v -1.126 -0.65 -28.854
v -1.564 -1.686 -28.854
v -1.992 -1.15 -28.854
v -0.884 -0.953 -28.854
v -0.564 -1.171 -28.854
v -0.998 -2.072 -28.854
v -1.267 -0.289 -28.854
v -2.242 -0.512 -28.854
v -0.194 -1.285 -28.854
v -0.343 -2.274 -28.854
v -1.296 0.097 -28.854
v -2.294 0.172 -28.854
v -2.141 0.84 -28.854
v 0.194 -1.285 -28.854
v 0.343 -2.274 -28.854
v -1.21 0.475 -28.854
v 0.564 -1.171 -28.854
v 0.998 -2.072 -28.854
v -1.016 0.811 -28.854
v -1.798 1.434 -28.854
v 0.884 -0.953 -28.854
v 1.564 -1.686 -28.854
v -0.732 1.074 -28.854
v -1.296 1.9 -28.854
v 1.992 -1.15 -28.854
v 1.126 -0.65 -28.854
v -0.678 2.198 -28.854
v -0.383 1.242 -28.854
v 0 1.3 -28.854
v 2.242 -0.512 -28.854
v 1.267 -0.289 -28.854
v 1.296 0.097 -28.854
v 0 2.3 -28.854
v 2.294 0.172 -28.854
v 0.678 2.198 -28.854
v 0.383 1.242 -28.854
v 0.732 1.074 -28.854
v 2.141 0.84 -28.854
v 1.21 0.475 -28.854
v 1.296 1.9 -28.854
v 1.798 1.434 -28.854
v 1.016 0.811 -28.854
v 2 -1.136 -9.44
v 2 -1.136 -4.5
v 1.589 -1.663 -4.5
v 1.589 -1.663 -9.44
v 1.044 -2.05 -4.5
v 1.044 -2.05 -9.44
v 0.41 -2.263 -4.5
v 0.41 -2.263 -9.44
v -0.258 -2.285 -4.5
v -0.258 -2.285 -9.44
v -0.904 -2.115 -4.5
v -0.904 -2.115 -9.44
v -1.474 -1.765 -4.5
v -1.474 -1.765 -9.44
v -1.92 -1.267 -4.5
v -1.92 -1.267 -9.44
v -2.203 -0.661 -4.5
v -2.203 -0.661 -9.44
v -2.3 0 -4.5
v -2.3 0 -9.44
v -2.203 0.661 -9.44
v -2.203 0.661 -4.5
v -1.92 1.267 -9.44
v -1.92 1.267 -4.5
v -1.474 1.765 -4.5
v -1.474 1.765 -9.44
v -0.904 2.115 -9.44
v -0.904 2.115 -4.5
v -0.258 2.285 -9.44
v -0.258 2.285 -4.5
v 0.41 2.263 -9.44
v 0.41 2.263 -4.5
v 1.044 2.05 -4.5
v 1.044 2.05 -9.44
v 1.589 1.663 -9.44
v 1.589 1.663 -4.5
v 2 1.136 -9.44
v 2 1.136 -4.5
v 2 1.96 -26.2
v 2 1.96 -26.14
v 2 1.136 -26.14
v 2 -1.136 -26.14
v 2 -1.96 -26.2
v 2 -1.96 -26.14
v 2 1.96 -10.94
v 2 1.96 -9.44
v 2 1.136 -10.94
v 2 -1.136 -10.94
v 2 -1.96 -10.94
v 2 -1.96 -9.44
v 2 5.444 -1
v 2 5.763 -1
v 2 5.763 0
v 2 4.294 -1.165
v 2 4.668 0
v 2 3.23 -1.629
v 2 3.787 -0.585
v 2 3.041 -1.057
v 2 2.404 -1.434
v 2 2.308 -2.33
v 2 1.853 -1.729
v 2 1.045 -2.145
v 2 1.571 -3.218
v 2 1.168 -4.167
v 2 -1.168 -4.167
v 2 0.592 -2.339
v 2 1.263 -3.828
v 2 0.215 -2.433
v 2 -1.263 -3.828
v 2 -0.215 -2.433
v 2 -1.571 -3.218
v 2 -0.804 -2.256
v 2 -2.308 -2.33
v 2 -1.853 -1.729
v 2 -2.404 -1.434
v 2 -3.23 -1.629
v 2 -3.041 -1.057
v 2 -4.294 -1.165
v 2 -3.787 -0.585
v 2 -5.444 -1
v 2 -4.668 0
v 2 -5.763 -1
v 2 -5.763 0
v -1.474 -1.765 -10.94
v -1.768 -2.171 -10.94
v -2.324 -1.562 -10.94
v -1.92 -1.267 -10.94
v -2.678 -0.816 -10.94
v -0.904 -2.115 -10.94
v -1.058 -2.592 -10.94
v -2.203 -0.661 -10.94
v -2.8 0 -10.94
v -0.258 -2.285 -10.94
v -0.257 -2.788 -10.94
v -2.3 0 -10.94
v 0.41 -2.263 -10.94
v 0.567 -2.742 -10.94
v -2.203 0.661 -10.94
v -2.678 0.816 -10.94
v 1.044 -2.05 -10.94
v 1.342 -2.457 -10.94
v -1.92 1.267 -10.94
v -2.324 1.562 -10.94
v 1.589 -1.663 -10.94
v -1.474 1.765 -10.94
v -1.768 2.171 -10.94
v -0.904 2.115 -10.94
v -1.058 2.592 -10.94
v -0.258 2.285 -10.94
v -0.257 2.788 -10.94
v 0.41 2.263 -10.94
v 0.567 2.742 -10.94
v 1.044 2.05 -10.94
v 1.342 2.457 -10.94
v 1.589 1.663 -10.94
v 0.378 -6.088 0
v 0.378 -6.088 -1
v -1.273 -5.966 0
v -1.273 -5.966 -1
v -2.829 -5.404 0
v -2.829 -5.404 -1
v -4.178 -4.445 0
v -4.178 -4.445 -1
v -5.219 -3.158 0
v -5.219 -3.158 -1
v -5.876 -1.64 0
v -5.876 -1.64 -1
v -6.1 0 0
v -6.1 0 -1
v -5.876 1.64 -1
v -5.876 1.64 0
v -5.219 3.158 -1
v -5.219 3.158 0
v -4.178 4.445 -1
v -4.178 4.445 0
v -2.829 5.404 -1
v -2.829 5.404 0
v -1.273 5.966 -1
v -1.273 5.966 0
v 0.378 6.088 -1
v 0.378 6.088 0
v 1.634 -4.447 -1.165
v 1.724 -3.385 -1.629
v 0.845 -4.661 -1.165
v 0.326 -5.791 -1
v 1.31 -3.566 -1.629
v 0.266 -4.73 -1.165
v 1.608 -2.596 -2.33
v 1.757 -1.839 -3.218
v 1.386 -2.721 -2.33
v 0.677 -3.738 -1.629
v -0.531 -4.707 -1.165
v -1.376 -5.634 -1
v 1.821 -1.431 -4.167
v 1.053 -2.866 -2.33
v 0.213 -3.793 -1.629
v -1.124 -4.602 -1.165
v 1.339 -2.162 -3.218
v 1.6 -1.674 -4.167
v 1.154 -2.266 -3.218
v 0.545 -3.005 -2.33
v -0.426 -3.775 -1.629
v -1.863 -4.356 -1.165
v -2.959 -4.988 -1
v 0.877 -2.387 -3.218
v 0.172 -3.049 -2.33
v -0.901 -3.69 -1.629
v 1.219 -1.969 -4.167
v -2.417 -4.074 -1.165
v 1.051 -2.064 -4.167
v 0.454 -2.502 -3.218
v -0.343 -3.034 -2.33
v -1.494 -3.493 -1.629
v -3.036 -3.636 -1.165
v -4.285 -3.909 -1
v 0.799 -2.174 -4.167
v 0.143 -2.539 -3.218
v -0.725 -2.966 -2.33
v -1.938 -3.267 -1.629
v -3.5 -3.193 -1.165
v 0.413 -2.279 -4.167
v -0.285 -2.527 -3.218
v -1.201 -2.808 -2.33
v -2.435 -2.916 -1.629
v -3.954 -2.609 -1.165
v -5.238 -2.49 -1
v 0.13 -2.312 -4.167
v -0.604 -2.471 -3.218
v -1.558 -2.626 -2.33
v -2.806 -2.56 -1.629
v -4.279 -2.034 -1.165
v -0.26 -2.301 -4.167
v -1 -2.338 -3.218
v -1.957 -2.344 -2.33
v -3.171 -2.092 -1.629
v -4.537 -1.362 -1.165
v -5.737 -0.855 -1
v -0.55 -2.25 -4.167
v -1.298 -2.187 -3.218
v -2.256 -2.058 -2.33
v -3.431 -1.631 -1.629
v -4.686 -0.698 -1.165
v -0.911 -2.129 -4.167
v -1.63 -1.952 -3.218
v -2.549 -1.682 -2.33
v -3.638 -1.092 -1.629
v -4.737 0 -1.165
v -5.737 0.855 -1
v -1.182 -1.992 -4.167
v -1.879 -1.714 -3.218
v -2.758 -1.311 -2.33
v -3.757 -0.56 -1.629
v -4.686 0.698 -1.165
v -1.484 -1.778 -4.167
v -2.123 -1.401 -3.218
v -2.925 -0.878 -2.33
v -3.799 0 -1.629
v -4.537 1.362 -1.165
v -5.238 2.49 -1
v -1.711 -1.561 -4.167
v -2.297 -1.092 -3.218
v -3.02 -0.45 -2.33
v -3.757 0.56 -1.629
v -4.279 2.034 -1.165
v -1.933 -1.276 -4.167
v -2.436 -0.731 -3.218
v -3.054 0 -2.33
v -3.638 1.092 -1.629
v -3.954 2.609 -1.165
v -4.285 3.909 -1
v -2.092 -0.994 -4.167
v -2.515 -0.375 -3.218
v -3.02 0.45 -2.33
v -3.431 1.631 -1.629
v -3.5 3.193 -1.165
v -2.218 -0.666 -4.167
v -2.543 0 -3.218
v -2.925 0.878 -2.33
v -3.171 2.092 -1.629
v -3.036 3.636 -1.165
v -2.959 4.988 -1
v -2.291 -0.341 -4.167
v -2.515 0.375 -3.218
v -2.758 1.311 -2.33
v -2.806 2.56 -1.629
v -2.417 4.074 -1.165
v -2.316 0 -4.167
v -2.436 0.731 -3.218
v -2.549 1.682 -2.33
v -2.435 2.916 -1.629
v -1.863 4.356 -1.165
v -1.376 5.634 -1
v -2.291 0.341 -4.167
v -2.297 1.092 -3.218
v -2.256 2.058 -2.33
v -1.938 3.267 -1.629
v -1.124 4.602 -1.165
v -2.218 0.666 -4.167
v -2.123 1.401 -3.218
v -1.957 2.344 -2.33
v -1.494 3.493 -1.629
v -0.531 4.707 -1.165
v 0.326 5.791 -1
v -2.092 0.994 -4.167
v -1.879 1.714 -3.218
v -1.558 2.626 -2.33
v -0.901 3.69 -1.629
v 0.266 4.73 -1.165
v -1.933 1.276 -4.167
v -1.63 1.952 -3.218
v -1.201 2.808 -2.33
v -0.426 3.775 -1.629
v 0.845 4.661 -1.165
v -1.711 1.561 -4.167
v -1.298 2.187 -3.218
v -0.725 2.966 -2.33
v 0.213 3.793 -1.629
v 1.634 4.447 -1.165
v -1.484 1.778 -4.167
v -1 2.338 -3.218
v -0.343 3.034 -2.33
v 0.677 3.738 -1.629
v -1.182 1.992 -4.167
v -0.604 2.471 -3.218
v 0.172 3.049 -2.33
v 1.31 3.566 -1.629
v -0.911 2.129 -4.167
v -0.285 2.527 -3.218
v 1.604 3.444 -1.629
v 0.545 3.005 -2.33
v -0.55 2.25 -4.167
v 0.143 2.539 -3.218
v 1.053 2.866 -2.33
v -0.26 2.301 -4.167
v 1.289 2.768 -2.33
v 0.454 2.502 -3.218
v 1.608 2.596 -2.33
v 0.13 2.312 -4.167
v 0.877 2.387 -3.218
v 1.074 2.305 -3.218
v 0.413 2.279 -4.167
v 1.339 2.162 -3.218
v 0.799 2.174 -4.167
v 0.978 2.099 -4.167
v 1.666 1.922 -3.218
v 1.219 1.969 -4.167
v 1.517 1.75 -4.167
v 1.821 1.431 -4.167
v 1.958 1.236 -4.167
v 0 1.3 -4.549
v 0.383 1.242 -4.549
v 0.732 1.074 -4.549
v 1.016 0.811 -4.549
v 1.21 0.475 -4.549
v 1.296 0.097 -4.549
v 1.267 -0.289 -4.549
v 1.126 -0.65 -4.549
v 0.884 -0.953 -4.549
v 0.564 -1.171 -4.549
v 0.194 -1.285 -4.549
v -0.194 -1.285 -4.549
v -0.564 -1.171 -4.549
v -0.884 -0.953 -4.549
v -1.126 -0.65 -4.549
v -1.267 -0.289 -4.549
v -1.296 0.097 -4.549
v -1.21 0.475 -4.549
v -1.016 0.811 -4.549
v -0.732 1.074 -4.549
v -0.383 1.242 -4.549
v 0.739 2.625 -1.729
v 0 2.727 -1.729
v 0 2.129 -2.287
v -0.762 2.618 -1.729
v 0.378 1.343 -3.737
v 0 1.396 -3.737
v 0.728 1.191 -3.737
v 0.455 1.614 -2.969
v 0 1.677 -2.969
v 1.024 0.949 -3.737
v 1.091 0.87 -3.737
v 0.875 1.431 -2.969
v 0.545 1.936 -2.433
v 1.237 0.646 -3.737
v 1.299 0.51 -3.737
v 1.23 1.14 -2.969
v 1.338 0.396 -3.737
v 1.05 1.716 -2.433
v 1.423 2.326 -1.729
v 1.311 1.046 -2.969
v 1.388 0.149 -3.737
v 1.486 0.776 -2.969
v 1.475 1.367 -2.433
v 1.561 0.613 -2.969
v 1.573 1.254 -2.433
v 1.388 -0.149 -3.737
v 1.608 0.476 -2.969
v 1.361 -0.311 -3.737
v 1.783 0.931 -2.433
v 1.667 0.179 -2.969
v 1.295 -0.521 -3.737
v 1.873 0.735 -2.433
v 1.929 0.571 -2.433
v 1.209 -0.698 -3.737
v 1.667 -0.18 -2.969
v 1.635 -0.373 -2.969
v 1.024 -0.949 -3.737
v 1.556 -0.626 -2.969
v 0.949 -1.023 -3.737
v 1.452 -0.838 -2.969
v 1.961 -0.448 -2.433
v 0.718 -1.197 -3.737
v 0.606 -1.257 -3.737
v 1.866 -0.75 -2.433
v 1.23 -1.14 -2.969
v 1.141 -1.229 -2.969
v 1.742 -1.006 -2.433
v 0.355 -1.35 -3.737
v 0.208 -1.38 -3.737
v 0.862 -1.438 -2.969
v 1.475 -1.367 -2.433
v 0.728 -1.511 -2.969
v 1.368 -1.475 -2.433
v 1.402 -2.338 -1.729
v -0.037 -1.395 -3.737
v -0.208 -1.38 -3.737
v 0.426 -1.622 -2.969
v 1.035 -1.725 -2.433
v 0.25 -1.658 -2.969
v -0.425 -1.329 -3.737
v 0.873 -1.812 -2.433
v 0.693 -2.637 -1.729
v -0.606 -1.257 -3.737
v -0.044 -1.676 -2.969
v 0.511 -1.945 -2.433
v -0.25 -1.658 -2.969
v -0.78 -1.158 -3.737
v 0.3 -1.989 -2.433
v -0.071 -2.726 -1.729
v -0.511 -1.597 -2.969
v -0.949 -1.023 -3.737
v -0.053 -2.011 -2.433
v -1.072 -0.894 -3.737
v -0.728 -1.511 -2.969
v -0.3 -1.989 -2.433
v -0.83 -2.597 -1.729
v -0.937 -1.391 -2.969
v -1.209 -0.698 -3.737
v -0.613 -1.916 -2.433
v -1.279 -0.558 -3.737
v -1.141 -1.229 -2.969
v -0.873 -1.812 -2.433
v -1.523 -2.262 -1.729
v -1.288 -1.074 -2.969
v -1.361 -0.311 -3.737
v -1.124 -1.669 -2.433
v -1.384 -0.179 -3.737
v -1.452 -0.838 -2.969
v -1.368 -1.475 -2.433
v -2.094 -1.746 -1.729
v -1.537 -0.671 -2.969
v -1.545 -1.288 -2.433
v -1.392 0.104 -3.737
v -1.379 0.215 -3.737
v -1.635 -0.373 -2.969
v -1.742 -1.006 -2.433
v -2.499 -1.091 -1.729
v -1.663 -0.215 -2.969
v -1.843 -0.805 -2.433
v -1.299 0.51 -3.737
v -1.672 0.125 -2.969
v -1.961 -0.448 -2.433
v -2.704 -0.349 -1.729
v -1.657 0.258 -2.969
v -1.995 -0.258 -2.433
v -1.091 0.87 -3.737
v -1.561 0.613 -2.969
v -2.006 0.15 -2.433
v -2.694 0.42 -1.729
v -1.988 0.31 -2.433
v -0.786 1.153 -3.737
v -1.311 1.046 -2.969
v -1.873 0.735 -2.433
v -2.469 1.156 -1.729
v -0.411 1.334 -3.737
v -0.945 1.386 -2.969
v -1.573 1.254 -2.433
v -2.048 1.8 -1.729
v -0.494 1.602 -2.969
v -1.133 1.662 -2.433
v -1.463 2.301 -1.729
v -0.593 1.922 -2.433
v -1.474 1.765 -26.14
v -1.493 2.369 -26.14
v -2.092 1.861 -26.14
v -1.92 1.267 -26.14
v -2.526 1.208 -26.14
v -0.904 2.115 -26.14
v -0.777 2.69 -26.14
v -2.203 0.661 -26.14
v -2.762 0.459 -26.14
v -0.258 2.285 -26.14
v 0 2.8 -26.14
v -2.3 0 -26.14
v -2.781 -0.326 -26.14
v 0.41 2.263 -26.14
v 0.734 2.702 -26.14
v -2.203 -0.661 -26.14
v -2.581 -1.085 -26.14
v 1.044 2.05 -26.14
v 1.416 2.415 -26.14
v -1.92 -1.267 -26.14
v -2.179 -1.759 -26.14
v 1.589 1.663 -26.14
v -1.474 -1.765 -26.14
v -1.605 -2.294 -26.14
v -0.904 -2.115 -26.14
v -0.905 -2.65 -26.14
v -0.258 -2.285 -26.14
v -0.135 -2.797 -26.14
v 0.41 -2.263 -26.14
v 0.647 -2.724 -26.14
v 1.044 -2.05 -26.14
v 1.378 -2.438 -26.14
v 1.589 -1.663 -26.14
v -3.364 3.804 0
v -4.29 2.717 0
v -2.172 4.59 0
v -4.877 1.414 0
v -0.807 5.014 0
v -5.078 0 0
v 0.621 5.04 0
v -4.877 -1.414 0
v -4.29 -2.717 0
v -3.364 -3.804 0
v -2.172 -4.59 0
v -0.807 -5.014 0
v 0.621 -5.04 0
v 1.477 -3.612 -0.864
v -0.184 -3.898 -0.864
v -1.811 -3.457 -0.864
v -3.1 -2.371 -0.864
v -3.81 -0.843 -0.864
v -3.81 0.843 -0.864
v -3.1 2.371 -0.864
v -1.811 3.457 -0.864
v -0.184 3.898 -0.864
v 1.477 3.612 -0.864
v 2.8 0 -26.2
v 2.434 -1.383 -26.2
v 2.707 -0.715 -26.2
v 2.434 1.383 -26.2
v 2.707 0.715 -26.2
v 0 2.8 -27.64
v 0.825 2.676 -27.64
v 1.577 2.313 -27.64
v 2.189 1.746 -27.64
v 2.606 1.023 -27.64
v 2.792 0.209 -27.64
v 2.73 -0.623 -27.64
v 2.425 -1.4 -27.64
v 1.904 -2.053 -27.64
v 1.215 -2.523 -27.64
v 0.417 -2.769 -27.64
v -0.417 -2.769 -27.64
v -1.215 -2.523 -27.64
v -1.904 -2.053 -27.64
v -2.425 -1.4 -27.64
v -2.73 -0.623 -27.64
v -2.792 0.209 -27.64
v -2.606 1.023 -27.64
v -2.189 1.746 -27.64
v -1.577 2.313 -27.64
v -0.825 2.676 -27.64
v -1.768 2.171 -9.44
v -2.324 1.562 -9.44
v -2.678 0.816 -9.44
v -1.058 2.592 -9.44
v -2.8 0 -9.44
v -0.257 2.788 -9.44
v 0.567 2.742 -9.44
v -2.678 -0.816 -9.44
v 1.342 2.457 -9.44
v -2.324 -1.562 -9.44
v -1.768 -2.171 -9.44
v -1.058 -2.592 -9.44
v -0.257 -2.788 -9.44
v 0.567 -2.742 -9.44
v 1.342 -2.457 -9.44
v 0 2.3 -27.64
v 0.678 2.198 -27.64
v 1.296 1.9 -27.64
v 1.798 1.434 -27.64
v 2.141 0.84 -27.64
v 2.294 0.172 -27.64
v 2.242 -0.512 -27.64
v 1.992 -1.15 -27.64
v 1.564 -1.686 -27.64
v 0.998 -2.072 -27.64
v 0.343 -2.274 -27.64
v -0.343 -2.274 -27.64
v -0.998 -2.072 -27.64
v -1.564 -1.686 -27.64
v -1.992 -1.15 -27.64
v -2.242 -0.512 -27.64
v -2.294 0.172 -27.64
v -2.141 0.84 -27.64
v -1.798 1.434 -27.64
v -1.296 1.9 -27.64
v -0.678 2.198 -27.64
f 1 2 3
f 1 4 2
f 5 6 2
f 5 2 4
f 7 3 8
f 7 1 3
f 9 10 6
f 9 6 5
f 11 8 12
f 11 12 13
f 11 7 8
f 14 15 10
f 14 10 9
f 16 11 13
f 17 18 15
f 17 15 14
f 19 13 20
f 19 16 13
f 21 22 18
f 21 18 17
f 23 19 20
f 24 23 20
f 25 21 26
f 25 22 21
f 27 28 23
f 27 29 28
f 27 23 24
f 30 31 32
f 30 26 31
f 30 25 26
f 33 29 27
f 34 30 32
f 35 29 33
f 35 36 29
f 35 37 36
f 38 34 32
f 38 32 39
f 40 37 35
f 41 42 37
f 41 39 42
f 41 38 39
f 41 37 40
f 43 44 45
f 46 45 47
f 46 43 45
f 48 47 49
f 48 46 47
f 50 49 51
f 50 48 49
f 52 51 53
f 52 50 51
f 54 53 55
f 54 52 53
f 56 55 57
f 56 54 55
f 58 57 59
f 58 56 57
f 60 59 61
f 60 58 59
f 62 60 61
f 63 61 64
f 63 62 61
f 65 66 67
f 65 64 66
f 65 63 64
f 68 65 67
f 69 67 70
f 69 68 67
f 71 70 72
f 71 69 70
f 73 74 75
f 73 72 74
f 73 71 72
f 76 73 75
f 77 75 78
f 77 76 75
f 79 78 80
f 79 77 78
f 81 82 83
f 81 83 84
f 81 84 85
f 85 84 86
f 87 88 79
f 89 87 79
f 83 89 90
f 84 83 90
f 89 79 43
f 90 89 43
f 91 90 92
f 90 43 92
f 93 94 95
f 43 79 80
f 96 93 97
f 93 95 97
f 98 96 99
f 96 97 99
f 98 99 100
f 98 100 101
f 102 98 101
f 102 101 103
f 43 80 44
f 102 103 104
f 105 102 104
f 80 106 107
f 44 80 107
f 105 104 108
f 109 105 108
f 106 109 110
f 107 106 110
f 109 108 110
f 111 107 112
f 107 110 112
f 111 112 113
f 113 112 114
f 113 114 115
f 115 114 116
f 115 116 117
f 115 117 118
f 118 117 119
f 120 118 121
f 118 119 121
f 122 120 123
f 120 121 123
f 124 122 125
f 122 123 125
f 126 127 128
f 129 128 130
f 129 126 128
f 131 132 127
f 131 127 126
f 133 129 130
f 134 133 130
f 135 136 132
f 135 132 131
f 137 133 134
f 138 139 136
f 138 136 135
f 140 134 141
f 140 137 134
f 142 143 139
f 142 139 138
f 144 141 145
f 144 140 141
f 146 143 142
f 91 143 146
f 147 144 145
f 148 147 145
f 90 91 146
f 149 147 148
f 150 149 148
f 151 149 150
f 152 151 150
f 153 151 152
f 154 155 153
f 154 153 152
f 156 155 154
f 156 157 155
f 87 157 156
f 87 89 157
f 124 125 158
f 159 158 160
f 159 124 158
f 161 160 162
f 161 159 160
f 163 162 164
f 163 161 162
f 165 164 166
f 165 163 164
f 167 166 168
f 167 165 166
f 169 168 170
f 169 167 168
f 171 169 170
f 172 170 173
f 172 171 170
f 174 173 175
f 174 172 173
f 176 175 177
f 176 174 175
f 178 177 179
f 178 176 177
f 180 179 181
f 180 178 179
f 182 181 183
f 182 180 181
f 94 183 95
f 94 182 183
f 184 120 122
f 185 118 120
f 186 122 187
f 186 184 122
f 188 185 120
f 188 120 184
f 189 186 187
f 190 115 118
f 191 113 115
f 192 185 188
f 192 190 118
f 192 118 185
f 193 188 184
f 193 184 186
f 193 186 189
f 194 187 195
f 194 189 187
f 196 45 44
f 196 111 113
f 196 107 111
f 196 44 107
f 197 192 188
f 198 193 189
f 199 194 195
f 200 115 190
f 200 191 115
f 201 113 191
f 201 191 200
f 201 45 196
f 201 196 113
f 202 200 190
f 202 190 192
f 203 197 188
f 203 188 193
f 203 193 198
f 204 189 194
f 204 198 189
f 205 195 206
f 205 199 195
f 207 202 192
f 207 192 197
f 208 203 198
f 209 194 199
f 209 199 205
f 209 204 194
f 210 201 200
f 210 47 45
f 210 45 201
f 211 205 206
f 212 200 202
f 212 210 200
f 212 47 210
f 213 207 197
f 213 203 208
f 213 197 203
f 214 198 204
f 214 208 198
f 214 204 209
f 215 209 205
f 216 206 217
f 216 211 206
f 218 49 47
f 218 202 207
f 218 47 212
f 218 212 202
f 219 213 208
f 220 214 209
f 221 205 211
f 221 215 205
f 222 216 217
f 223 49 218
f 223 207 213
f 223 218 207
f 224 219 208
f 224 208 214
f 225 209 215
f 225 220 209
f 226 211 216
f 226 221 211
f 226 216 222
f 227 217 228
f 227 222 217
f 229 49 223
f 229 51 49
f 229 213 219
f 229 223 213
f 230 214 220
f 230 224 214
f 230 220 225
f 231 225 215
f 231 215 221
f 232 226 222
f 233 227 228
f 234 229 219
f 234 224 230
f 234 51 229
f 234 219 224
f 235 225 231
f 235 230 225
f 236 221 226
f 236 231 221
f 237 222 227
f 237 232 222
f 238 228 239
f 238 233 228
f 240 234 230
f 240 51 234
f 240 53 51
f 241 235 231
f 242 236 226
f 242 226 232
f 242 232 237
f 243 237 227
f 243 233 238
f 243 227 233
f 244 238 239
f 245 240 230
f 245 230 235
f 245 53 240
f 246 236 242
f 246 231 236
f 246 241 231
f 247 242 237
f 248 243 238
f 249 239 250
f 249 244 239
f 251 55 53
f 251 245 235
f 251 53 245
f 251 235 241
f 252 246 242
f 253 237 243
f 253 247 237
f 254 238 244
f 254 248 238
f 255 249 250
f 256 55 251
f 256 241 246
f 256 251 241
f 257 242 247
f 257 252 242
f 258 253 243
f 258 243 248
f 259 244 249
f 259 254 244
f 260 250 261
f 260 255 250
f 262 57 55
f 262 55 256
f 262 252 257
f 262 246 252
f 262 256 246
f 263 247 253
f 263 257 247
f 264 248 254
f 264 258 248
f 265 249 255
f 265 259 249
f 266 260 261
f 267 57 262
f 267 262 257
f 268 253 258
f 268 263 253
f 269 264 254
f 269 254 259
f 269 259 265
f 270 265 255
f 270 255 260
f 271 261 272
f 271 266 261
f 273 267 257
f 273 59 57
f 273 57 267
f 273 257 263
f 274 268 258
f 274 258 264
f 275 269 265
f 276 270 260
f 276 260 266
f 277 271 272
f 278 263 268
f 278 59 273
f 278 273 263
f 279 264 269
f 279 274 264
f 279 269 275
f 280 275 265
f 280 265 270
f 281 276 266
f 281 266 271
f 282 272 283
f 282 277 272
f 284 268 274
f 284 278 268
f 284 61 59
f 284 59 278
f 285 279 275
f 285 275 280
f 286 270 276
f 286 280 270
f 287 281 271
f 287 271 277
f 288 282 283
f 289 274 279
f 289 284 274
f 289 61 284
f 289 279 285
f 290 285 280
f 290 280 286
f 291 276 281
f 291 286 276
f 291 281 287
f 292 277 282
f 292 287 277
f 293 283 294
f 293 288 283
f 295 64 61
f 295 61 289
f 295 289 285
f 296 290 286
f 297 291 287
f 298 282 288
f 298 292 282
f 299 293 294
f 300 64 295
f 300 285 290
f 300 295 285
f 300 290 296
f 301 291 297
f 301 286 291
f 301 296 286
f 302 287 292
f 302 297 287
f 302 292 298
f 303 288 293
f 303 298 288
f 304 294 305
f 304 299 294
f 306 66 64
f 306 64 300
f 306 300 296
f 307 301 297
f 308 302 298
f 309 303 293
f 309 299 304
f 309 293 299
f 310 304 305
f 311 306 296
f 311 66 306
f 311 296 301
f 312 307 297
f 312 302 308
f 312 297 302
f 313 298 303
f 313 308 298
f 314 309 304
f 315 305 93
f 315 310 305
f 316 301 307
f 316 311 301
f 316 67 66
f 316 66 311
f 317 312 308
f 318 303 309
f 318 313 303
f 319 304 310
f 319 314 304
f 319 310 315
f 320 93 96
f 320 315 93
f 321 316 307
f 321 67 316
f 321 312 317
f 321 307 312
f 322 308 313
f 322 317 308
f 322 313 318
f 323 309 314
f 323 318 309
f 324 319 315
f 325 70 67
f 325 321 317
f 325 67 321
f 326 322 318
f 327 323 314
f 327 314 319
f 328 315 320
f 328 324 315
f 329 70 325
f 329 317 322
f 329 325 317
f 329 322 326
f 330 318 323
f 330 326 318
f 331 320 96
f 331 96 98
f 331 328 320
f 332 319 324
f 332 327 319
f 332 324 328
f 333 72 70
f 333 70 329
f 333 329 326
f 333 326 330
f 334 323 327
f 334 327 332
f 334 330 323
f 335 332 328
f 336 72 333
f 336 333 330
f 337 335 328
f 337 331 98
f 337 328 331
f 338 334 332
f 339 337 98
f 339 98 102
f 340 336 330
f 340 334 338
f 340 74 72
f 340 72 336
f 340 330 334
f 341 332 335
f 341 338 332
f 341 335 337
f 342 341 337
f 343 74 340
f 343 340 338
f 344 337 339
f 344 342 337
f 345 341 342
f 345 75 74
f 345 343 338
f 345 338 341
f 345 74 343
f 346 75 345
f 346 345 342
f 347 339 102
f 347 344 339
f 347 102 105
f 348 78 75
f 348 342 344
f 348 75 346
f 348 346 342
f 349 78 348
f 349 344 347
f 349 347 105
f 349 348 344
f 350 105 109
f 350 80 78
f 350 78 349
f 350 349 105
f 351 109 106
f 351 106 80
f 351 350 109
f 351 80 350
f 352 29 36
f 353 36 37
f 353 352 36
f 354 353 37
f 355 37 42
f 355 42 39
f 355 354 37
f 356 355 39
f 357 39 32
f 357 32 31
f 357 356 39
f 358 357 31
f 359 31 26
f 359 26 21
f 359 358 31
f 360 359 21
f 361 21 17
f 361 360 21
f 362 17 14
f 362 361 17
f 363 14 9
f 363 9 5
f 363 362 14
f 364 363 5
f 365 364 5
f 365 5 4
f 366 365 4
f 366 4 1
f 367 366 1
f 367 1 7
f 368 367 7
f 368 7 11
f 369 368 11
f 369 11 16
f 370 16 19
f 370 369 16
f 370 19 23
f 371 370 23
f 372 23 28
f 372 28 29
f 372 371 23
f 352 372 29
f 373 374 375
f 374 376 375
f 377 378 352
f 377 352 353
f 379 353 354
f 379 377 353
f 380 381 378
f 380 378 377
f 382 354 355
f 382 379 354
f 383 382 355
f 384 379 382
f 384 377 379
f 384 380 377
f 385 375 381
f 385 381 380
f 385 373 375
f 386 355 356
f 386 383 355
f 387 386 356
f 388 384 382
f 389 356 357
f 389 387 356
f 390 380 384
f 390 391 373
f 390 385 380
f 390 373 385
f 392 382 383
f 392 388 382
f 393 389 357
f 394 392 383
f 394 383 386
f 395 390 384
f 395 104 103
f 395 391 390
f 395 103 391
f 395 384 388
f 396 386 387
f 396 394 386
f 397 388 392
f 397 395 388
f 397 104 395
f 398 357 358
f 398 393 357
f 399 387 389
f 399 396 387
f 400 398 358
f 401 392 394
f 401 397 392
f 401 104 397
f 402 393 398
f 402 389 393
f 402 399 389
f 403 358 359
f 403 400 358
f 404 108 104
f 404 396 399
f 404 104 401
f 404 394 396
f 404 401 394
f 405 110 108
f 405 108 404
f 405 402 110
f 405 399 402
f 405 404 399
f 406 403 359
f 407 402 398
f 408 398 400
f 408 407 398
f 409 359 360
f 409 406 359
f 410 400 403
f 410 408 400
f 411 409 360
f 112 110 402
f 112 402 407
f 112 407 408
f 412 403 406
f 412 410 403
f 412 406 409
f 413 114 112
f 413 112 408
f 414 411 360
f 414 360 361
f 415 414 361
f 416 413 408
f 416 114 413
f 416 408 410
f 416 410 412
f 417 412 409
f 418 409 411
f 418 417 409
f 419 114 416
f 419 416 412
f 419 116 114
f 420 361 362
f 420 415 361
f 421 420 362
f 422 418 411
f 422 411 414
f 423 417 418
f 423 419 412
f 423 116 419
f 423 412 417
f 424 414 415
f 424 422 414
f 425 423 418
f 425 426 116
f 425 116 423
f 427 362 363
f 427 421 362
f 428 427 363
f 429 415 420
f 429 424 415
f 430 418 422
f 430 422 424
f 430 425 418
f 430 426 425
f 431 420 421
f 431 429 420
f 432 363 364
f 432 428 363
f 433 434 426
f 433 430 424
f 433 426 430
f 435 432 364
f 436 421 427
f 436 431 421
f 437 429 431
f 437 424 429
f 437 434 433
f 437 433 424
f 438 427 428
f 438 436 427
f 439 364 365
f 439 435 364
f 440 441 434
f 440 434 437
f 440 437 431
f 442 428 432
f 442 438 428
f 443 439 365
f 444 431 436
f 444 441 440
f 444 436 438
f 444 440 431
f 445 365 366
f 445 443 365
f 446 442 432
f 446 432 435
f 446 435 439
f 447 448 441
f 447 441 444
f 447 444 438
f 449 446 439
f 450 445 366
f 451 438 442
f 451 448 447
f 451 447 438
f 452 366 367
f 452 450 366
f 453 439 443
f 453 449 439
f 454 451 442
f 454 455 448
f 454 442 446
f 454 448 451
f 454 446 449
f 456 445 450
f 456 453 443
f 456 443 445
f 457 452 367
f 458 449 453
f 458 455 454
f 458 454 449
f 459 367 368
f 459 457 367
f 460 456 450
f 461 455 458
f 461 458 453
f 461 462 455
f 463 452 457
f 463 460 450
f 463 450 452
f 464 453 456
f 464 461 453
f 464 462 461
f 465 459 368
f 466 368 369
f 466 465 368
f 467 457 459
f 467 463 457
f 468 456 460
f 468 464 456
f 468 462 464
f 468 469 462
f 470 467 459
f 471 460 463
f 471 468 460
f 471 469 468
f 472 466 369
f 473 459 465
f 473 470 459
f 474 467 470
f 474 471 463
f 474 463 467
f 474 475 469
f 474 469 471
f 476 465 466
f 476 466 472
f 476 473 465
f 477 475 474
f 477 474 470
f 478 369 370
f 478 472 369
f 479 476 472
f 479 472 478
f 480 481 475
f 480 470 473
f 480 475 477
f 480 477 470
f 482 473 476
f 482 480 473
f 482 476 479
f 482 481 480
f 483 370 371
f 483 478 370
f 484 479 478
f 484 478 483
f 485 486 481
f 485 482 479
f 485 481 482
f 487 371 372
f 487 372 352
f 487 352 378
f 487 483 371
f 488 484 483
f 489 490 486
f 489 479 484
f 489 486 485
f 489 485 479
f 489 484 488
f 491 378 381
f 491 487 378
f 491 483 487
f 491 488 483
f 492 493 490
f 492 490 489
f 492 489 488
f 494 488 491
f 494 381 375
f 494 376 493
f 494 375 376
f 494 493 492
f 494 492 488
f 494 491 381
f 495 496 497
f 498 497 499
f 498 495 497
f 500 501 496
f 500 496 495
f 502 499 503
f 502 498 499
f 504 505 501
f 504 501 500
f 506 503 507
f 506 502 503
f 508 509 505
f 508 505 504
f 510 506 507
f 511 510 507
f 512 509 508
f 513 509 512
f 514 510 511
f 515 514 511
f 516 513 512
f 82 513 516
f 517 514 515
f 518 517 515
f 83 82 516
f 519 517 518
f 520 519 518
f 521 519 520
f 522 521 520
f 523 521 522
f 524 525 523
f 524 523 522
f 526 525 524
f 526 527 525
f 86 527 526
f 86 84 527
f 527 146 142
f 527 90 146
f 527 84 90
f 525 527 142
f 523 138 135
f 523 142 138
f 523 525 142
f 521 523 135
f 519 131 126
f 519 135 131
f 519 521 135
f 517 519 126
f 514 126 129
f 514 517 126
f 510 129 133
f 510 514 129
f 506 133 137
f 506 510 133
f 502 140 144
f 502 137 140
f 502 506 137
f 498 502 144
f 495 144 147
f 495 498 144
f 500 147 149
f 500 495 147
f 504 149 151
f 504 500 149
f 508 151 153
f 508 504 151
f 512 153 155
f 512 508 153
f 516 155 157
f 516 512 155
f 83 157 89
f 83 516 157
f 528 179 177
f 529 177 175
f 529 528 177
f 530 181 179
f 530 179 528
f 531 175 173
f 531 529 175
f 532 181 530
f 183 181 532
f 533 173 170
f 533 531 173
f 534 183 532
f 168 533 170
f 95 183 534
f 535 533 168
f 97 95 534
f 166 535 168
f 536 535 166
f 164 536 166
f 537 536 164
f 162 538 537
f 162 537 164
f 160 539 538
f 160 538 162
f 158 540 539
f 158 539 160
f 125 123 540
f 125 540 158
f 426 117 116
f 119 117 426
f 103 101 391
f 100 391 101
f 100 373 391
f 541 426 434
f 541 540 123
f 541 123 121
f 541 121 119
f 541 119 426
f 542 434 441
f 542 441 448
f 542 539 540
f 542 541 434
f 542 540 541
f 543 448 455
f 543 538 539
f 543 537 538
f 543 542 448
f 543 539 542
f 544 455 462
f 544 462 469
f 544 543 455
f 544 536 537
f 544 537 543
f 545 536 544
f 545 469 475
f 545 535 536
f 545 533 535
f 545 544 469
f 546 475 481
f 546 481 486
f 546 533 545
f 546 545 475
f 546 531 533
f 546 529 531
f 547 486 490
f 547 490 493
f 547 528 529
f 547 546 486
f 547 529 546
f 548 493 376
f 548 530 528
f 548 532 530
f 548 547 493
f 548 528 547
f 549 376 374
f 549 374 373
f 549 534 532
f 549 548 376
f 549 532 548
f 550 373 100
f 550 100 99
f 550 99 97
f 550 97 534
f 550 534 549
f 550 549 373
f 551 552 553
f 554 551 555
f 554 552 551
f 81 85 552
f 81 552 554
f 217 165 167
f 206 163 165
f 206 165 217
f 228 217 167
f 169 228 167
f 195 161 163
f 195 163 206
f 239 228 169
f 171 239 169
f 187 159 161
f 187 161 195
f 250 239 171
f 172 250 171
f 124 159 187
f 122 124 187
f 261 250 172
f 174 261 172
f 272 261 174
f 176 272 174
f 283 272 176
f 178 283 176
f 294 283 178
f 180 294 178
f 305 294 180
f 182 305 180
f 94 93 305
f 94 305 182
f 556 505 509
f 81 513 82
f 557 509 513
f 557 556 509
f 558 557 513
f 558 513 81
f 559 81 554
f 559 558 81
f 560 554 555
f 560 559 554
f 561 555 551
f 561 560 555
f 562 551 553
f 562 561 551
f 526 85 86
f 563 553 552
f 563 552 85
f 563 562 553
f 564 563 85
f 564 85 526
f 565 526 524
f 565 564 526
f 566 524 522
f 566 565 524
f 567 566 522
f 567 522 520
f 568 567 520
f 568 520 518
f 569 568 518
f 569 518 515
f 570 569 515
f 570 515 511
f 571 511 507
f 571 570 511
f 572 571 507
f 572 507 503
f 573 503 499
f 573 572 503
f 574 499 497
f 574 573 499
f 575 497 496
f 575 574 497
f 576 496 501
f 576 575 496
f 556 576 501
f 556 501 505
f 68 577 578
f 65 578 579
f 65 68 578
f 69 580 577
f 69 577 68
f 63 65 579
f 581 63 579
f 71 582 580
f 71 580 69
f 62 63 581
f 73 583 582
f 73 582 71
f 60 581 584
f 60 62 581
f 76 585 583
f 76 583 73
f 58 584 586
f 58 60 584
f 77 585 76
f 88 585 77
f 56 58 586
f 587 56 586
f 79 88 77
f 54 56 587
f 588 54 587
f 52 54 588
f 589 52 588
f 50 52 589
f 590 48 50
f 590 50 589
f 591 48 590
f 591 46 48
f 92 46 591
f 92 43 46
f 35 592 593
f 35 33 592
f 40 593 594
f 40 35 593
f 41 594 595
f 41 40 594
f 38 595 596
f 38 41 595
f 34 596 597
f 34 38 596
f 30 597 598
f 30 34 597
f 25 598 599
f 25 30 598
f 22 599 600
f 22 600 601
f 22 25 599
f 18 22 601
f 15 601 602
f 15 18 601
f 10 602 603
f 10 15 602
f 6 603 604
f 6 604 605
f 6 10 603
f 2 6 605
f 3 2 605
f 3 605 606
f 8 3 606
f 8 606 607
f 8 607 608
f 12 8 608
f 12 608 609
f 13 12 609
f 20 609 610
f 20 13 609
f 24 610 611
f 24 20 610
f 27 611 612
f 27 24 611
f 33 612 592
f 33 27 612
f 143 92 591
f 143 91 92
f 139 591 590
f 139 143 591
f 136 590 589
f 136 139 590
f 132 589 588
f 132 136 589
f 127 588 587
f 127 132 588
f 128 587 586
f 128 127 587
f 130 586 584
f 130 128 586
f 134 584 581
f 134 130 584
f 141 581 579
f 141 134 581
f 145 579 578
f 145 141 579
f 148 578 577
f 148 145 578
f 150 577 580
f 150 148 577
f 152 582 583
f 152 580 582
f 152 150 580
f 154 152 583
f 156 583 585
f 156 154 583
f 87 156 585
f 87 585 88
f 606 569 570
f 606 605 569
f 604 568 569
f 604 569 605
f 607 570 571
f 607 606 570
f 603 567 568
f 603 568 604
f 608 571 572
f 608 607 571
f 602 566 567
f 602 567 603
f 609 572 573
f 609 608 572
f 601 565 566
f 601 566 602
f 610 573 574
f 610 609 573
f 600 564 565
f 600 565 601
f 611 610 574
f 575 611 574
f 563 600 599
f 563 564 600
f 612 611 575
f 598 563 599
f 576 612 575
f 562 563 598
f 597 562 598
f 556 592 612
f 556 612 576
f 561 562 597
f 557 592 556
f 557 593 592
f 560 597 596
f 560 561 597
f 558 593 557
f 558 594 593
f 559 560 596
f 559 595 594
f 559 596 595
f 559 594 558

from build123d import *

# Parameters (mm, degrees)
CUT_EXTRUDE1_DEPTH = 26.2


with BuildPart() as part:
    # Sketch1 → Revolve1 (revolve)
    with BuildSketch(Plane(origin=(0, 0, 0), x_dir=(0, 0, -1), z_dir=(1, 0, 0))):
        with BuildLine():
            Line((0, 5.078211692), (0, 6.1))
            Line((0, 6.1), (1, 6.1))
            Line((1, 6.1), (1, 5.8))
            ThreePointArc((1, 5.8), (2.025126266, 3.325126266), (4.5, 2.3))
            Line((4.5, 2.3), (9.440083729, 2.3))
            Line((9.440083729, 2.3), (9.440083729, 2.8))
            Line((9.440083729, 2.8), (10.940083729, 2.8))
            Line((10.940083729, 2.8), (10.940083729, 2.3))
            Line((10.940083729, 2.3), (26.140083729, 2.3))
            Line((26.140083729, 2.3), (26.140083729, 2.8))
            Line((26.140083729, 2.8), (27.640083729, 2.8))
            Line((27.640083729, 2.8), (27.640083729, 2.3))
            Line((27.640083729, 2.3), (28.853856016, 2.3))
            Line((28.853856016, 2.3), (28.853856016, 1.3))
            Line((28.853856016, 1.3), (4.548739728, 1.3))
            ThreePointArc((4.548739728, 1.3), (2.968613199, 1.676988608), (1.728880785, 2.72674277))
            Line((1.728880785, 2.72674277), (0, 5.078211692))
        make_face()
    revolve(axis=Axis((0, 0, 0), (0, 0, -1)))

    # Sketch2 → Cut-Extrude1 (cut)
    with BuildSketch(Plane.XY):
        Polygon((2, 6), (2, -6.569031419), (7.819181693, -6.569031419), (7.708002274, 5.9580813), align=None)
    extrude(amount=-CUT_EXTRUDE1_DEPTH, mode=Mode.SUBTRACT)


solid = part.part
